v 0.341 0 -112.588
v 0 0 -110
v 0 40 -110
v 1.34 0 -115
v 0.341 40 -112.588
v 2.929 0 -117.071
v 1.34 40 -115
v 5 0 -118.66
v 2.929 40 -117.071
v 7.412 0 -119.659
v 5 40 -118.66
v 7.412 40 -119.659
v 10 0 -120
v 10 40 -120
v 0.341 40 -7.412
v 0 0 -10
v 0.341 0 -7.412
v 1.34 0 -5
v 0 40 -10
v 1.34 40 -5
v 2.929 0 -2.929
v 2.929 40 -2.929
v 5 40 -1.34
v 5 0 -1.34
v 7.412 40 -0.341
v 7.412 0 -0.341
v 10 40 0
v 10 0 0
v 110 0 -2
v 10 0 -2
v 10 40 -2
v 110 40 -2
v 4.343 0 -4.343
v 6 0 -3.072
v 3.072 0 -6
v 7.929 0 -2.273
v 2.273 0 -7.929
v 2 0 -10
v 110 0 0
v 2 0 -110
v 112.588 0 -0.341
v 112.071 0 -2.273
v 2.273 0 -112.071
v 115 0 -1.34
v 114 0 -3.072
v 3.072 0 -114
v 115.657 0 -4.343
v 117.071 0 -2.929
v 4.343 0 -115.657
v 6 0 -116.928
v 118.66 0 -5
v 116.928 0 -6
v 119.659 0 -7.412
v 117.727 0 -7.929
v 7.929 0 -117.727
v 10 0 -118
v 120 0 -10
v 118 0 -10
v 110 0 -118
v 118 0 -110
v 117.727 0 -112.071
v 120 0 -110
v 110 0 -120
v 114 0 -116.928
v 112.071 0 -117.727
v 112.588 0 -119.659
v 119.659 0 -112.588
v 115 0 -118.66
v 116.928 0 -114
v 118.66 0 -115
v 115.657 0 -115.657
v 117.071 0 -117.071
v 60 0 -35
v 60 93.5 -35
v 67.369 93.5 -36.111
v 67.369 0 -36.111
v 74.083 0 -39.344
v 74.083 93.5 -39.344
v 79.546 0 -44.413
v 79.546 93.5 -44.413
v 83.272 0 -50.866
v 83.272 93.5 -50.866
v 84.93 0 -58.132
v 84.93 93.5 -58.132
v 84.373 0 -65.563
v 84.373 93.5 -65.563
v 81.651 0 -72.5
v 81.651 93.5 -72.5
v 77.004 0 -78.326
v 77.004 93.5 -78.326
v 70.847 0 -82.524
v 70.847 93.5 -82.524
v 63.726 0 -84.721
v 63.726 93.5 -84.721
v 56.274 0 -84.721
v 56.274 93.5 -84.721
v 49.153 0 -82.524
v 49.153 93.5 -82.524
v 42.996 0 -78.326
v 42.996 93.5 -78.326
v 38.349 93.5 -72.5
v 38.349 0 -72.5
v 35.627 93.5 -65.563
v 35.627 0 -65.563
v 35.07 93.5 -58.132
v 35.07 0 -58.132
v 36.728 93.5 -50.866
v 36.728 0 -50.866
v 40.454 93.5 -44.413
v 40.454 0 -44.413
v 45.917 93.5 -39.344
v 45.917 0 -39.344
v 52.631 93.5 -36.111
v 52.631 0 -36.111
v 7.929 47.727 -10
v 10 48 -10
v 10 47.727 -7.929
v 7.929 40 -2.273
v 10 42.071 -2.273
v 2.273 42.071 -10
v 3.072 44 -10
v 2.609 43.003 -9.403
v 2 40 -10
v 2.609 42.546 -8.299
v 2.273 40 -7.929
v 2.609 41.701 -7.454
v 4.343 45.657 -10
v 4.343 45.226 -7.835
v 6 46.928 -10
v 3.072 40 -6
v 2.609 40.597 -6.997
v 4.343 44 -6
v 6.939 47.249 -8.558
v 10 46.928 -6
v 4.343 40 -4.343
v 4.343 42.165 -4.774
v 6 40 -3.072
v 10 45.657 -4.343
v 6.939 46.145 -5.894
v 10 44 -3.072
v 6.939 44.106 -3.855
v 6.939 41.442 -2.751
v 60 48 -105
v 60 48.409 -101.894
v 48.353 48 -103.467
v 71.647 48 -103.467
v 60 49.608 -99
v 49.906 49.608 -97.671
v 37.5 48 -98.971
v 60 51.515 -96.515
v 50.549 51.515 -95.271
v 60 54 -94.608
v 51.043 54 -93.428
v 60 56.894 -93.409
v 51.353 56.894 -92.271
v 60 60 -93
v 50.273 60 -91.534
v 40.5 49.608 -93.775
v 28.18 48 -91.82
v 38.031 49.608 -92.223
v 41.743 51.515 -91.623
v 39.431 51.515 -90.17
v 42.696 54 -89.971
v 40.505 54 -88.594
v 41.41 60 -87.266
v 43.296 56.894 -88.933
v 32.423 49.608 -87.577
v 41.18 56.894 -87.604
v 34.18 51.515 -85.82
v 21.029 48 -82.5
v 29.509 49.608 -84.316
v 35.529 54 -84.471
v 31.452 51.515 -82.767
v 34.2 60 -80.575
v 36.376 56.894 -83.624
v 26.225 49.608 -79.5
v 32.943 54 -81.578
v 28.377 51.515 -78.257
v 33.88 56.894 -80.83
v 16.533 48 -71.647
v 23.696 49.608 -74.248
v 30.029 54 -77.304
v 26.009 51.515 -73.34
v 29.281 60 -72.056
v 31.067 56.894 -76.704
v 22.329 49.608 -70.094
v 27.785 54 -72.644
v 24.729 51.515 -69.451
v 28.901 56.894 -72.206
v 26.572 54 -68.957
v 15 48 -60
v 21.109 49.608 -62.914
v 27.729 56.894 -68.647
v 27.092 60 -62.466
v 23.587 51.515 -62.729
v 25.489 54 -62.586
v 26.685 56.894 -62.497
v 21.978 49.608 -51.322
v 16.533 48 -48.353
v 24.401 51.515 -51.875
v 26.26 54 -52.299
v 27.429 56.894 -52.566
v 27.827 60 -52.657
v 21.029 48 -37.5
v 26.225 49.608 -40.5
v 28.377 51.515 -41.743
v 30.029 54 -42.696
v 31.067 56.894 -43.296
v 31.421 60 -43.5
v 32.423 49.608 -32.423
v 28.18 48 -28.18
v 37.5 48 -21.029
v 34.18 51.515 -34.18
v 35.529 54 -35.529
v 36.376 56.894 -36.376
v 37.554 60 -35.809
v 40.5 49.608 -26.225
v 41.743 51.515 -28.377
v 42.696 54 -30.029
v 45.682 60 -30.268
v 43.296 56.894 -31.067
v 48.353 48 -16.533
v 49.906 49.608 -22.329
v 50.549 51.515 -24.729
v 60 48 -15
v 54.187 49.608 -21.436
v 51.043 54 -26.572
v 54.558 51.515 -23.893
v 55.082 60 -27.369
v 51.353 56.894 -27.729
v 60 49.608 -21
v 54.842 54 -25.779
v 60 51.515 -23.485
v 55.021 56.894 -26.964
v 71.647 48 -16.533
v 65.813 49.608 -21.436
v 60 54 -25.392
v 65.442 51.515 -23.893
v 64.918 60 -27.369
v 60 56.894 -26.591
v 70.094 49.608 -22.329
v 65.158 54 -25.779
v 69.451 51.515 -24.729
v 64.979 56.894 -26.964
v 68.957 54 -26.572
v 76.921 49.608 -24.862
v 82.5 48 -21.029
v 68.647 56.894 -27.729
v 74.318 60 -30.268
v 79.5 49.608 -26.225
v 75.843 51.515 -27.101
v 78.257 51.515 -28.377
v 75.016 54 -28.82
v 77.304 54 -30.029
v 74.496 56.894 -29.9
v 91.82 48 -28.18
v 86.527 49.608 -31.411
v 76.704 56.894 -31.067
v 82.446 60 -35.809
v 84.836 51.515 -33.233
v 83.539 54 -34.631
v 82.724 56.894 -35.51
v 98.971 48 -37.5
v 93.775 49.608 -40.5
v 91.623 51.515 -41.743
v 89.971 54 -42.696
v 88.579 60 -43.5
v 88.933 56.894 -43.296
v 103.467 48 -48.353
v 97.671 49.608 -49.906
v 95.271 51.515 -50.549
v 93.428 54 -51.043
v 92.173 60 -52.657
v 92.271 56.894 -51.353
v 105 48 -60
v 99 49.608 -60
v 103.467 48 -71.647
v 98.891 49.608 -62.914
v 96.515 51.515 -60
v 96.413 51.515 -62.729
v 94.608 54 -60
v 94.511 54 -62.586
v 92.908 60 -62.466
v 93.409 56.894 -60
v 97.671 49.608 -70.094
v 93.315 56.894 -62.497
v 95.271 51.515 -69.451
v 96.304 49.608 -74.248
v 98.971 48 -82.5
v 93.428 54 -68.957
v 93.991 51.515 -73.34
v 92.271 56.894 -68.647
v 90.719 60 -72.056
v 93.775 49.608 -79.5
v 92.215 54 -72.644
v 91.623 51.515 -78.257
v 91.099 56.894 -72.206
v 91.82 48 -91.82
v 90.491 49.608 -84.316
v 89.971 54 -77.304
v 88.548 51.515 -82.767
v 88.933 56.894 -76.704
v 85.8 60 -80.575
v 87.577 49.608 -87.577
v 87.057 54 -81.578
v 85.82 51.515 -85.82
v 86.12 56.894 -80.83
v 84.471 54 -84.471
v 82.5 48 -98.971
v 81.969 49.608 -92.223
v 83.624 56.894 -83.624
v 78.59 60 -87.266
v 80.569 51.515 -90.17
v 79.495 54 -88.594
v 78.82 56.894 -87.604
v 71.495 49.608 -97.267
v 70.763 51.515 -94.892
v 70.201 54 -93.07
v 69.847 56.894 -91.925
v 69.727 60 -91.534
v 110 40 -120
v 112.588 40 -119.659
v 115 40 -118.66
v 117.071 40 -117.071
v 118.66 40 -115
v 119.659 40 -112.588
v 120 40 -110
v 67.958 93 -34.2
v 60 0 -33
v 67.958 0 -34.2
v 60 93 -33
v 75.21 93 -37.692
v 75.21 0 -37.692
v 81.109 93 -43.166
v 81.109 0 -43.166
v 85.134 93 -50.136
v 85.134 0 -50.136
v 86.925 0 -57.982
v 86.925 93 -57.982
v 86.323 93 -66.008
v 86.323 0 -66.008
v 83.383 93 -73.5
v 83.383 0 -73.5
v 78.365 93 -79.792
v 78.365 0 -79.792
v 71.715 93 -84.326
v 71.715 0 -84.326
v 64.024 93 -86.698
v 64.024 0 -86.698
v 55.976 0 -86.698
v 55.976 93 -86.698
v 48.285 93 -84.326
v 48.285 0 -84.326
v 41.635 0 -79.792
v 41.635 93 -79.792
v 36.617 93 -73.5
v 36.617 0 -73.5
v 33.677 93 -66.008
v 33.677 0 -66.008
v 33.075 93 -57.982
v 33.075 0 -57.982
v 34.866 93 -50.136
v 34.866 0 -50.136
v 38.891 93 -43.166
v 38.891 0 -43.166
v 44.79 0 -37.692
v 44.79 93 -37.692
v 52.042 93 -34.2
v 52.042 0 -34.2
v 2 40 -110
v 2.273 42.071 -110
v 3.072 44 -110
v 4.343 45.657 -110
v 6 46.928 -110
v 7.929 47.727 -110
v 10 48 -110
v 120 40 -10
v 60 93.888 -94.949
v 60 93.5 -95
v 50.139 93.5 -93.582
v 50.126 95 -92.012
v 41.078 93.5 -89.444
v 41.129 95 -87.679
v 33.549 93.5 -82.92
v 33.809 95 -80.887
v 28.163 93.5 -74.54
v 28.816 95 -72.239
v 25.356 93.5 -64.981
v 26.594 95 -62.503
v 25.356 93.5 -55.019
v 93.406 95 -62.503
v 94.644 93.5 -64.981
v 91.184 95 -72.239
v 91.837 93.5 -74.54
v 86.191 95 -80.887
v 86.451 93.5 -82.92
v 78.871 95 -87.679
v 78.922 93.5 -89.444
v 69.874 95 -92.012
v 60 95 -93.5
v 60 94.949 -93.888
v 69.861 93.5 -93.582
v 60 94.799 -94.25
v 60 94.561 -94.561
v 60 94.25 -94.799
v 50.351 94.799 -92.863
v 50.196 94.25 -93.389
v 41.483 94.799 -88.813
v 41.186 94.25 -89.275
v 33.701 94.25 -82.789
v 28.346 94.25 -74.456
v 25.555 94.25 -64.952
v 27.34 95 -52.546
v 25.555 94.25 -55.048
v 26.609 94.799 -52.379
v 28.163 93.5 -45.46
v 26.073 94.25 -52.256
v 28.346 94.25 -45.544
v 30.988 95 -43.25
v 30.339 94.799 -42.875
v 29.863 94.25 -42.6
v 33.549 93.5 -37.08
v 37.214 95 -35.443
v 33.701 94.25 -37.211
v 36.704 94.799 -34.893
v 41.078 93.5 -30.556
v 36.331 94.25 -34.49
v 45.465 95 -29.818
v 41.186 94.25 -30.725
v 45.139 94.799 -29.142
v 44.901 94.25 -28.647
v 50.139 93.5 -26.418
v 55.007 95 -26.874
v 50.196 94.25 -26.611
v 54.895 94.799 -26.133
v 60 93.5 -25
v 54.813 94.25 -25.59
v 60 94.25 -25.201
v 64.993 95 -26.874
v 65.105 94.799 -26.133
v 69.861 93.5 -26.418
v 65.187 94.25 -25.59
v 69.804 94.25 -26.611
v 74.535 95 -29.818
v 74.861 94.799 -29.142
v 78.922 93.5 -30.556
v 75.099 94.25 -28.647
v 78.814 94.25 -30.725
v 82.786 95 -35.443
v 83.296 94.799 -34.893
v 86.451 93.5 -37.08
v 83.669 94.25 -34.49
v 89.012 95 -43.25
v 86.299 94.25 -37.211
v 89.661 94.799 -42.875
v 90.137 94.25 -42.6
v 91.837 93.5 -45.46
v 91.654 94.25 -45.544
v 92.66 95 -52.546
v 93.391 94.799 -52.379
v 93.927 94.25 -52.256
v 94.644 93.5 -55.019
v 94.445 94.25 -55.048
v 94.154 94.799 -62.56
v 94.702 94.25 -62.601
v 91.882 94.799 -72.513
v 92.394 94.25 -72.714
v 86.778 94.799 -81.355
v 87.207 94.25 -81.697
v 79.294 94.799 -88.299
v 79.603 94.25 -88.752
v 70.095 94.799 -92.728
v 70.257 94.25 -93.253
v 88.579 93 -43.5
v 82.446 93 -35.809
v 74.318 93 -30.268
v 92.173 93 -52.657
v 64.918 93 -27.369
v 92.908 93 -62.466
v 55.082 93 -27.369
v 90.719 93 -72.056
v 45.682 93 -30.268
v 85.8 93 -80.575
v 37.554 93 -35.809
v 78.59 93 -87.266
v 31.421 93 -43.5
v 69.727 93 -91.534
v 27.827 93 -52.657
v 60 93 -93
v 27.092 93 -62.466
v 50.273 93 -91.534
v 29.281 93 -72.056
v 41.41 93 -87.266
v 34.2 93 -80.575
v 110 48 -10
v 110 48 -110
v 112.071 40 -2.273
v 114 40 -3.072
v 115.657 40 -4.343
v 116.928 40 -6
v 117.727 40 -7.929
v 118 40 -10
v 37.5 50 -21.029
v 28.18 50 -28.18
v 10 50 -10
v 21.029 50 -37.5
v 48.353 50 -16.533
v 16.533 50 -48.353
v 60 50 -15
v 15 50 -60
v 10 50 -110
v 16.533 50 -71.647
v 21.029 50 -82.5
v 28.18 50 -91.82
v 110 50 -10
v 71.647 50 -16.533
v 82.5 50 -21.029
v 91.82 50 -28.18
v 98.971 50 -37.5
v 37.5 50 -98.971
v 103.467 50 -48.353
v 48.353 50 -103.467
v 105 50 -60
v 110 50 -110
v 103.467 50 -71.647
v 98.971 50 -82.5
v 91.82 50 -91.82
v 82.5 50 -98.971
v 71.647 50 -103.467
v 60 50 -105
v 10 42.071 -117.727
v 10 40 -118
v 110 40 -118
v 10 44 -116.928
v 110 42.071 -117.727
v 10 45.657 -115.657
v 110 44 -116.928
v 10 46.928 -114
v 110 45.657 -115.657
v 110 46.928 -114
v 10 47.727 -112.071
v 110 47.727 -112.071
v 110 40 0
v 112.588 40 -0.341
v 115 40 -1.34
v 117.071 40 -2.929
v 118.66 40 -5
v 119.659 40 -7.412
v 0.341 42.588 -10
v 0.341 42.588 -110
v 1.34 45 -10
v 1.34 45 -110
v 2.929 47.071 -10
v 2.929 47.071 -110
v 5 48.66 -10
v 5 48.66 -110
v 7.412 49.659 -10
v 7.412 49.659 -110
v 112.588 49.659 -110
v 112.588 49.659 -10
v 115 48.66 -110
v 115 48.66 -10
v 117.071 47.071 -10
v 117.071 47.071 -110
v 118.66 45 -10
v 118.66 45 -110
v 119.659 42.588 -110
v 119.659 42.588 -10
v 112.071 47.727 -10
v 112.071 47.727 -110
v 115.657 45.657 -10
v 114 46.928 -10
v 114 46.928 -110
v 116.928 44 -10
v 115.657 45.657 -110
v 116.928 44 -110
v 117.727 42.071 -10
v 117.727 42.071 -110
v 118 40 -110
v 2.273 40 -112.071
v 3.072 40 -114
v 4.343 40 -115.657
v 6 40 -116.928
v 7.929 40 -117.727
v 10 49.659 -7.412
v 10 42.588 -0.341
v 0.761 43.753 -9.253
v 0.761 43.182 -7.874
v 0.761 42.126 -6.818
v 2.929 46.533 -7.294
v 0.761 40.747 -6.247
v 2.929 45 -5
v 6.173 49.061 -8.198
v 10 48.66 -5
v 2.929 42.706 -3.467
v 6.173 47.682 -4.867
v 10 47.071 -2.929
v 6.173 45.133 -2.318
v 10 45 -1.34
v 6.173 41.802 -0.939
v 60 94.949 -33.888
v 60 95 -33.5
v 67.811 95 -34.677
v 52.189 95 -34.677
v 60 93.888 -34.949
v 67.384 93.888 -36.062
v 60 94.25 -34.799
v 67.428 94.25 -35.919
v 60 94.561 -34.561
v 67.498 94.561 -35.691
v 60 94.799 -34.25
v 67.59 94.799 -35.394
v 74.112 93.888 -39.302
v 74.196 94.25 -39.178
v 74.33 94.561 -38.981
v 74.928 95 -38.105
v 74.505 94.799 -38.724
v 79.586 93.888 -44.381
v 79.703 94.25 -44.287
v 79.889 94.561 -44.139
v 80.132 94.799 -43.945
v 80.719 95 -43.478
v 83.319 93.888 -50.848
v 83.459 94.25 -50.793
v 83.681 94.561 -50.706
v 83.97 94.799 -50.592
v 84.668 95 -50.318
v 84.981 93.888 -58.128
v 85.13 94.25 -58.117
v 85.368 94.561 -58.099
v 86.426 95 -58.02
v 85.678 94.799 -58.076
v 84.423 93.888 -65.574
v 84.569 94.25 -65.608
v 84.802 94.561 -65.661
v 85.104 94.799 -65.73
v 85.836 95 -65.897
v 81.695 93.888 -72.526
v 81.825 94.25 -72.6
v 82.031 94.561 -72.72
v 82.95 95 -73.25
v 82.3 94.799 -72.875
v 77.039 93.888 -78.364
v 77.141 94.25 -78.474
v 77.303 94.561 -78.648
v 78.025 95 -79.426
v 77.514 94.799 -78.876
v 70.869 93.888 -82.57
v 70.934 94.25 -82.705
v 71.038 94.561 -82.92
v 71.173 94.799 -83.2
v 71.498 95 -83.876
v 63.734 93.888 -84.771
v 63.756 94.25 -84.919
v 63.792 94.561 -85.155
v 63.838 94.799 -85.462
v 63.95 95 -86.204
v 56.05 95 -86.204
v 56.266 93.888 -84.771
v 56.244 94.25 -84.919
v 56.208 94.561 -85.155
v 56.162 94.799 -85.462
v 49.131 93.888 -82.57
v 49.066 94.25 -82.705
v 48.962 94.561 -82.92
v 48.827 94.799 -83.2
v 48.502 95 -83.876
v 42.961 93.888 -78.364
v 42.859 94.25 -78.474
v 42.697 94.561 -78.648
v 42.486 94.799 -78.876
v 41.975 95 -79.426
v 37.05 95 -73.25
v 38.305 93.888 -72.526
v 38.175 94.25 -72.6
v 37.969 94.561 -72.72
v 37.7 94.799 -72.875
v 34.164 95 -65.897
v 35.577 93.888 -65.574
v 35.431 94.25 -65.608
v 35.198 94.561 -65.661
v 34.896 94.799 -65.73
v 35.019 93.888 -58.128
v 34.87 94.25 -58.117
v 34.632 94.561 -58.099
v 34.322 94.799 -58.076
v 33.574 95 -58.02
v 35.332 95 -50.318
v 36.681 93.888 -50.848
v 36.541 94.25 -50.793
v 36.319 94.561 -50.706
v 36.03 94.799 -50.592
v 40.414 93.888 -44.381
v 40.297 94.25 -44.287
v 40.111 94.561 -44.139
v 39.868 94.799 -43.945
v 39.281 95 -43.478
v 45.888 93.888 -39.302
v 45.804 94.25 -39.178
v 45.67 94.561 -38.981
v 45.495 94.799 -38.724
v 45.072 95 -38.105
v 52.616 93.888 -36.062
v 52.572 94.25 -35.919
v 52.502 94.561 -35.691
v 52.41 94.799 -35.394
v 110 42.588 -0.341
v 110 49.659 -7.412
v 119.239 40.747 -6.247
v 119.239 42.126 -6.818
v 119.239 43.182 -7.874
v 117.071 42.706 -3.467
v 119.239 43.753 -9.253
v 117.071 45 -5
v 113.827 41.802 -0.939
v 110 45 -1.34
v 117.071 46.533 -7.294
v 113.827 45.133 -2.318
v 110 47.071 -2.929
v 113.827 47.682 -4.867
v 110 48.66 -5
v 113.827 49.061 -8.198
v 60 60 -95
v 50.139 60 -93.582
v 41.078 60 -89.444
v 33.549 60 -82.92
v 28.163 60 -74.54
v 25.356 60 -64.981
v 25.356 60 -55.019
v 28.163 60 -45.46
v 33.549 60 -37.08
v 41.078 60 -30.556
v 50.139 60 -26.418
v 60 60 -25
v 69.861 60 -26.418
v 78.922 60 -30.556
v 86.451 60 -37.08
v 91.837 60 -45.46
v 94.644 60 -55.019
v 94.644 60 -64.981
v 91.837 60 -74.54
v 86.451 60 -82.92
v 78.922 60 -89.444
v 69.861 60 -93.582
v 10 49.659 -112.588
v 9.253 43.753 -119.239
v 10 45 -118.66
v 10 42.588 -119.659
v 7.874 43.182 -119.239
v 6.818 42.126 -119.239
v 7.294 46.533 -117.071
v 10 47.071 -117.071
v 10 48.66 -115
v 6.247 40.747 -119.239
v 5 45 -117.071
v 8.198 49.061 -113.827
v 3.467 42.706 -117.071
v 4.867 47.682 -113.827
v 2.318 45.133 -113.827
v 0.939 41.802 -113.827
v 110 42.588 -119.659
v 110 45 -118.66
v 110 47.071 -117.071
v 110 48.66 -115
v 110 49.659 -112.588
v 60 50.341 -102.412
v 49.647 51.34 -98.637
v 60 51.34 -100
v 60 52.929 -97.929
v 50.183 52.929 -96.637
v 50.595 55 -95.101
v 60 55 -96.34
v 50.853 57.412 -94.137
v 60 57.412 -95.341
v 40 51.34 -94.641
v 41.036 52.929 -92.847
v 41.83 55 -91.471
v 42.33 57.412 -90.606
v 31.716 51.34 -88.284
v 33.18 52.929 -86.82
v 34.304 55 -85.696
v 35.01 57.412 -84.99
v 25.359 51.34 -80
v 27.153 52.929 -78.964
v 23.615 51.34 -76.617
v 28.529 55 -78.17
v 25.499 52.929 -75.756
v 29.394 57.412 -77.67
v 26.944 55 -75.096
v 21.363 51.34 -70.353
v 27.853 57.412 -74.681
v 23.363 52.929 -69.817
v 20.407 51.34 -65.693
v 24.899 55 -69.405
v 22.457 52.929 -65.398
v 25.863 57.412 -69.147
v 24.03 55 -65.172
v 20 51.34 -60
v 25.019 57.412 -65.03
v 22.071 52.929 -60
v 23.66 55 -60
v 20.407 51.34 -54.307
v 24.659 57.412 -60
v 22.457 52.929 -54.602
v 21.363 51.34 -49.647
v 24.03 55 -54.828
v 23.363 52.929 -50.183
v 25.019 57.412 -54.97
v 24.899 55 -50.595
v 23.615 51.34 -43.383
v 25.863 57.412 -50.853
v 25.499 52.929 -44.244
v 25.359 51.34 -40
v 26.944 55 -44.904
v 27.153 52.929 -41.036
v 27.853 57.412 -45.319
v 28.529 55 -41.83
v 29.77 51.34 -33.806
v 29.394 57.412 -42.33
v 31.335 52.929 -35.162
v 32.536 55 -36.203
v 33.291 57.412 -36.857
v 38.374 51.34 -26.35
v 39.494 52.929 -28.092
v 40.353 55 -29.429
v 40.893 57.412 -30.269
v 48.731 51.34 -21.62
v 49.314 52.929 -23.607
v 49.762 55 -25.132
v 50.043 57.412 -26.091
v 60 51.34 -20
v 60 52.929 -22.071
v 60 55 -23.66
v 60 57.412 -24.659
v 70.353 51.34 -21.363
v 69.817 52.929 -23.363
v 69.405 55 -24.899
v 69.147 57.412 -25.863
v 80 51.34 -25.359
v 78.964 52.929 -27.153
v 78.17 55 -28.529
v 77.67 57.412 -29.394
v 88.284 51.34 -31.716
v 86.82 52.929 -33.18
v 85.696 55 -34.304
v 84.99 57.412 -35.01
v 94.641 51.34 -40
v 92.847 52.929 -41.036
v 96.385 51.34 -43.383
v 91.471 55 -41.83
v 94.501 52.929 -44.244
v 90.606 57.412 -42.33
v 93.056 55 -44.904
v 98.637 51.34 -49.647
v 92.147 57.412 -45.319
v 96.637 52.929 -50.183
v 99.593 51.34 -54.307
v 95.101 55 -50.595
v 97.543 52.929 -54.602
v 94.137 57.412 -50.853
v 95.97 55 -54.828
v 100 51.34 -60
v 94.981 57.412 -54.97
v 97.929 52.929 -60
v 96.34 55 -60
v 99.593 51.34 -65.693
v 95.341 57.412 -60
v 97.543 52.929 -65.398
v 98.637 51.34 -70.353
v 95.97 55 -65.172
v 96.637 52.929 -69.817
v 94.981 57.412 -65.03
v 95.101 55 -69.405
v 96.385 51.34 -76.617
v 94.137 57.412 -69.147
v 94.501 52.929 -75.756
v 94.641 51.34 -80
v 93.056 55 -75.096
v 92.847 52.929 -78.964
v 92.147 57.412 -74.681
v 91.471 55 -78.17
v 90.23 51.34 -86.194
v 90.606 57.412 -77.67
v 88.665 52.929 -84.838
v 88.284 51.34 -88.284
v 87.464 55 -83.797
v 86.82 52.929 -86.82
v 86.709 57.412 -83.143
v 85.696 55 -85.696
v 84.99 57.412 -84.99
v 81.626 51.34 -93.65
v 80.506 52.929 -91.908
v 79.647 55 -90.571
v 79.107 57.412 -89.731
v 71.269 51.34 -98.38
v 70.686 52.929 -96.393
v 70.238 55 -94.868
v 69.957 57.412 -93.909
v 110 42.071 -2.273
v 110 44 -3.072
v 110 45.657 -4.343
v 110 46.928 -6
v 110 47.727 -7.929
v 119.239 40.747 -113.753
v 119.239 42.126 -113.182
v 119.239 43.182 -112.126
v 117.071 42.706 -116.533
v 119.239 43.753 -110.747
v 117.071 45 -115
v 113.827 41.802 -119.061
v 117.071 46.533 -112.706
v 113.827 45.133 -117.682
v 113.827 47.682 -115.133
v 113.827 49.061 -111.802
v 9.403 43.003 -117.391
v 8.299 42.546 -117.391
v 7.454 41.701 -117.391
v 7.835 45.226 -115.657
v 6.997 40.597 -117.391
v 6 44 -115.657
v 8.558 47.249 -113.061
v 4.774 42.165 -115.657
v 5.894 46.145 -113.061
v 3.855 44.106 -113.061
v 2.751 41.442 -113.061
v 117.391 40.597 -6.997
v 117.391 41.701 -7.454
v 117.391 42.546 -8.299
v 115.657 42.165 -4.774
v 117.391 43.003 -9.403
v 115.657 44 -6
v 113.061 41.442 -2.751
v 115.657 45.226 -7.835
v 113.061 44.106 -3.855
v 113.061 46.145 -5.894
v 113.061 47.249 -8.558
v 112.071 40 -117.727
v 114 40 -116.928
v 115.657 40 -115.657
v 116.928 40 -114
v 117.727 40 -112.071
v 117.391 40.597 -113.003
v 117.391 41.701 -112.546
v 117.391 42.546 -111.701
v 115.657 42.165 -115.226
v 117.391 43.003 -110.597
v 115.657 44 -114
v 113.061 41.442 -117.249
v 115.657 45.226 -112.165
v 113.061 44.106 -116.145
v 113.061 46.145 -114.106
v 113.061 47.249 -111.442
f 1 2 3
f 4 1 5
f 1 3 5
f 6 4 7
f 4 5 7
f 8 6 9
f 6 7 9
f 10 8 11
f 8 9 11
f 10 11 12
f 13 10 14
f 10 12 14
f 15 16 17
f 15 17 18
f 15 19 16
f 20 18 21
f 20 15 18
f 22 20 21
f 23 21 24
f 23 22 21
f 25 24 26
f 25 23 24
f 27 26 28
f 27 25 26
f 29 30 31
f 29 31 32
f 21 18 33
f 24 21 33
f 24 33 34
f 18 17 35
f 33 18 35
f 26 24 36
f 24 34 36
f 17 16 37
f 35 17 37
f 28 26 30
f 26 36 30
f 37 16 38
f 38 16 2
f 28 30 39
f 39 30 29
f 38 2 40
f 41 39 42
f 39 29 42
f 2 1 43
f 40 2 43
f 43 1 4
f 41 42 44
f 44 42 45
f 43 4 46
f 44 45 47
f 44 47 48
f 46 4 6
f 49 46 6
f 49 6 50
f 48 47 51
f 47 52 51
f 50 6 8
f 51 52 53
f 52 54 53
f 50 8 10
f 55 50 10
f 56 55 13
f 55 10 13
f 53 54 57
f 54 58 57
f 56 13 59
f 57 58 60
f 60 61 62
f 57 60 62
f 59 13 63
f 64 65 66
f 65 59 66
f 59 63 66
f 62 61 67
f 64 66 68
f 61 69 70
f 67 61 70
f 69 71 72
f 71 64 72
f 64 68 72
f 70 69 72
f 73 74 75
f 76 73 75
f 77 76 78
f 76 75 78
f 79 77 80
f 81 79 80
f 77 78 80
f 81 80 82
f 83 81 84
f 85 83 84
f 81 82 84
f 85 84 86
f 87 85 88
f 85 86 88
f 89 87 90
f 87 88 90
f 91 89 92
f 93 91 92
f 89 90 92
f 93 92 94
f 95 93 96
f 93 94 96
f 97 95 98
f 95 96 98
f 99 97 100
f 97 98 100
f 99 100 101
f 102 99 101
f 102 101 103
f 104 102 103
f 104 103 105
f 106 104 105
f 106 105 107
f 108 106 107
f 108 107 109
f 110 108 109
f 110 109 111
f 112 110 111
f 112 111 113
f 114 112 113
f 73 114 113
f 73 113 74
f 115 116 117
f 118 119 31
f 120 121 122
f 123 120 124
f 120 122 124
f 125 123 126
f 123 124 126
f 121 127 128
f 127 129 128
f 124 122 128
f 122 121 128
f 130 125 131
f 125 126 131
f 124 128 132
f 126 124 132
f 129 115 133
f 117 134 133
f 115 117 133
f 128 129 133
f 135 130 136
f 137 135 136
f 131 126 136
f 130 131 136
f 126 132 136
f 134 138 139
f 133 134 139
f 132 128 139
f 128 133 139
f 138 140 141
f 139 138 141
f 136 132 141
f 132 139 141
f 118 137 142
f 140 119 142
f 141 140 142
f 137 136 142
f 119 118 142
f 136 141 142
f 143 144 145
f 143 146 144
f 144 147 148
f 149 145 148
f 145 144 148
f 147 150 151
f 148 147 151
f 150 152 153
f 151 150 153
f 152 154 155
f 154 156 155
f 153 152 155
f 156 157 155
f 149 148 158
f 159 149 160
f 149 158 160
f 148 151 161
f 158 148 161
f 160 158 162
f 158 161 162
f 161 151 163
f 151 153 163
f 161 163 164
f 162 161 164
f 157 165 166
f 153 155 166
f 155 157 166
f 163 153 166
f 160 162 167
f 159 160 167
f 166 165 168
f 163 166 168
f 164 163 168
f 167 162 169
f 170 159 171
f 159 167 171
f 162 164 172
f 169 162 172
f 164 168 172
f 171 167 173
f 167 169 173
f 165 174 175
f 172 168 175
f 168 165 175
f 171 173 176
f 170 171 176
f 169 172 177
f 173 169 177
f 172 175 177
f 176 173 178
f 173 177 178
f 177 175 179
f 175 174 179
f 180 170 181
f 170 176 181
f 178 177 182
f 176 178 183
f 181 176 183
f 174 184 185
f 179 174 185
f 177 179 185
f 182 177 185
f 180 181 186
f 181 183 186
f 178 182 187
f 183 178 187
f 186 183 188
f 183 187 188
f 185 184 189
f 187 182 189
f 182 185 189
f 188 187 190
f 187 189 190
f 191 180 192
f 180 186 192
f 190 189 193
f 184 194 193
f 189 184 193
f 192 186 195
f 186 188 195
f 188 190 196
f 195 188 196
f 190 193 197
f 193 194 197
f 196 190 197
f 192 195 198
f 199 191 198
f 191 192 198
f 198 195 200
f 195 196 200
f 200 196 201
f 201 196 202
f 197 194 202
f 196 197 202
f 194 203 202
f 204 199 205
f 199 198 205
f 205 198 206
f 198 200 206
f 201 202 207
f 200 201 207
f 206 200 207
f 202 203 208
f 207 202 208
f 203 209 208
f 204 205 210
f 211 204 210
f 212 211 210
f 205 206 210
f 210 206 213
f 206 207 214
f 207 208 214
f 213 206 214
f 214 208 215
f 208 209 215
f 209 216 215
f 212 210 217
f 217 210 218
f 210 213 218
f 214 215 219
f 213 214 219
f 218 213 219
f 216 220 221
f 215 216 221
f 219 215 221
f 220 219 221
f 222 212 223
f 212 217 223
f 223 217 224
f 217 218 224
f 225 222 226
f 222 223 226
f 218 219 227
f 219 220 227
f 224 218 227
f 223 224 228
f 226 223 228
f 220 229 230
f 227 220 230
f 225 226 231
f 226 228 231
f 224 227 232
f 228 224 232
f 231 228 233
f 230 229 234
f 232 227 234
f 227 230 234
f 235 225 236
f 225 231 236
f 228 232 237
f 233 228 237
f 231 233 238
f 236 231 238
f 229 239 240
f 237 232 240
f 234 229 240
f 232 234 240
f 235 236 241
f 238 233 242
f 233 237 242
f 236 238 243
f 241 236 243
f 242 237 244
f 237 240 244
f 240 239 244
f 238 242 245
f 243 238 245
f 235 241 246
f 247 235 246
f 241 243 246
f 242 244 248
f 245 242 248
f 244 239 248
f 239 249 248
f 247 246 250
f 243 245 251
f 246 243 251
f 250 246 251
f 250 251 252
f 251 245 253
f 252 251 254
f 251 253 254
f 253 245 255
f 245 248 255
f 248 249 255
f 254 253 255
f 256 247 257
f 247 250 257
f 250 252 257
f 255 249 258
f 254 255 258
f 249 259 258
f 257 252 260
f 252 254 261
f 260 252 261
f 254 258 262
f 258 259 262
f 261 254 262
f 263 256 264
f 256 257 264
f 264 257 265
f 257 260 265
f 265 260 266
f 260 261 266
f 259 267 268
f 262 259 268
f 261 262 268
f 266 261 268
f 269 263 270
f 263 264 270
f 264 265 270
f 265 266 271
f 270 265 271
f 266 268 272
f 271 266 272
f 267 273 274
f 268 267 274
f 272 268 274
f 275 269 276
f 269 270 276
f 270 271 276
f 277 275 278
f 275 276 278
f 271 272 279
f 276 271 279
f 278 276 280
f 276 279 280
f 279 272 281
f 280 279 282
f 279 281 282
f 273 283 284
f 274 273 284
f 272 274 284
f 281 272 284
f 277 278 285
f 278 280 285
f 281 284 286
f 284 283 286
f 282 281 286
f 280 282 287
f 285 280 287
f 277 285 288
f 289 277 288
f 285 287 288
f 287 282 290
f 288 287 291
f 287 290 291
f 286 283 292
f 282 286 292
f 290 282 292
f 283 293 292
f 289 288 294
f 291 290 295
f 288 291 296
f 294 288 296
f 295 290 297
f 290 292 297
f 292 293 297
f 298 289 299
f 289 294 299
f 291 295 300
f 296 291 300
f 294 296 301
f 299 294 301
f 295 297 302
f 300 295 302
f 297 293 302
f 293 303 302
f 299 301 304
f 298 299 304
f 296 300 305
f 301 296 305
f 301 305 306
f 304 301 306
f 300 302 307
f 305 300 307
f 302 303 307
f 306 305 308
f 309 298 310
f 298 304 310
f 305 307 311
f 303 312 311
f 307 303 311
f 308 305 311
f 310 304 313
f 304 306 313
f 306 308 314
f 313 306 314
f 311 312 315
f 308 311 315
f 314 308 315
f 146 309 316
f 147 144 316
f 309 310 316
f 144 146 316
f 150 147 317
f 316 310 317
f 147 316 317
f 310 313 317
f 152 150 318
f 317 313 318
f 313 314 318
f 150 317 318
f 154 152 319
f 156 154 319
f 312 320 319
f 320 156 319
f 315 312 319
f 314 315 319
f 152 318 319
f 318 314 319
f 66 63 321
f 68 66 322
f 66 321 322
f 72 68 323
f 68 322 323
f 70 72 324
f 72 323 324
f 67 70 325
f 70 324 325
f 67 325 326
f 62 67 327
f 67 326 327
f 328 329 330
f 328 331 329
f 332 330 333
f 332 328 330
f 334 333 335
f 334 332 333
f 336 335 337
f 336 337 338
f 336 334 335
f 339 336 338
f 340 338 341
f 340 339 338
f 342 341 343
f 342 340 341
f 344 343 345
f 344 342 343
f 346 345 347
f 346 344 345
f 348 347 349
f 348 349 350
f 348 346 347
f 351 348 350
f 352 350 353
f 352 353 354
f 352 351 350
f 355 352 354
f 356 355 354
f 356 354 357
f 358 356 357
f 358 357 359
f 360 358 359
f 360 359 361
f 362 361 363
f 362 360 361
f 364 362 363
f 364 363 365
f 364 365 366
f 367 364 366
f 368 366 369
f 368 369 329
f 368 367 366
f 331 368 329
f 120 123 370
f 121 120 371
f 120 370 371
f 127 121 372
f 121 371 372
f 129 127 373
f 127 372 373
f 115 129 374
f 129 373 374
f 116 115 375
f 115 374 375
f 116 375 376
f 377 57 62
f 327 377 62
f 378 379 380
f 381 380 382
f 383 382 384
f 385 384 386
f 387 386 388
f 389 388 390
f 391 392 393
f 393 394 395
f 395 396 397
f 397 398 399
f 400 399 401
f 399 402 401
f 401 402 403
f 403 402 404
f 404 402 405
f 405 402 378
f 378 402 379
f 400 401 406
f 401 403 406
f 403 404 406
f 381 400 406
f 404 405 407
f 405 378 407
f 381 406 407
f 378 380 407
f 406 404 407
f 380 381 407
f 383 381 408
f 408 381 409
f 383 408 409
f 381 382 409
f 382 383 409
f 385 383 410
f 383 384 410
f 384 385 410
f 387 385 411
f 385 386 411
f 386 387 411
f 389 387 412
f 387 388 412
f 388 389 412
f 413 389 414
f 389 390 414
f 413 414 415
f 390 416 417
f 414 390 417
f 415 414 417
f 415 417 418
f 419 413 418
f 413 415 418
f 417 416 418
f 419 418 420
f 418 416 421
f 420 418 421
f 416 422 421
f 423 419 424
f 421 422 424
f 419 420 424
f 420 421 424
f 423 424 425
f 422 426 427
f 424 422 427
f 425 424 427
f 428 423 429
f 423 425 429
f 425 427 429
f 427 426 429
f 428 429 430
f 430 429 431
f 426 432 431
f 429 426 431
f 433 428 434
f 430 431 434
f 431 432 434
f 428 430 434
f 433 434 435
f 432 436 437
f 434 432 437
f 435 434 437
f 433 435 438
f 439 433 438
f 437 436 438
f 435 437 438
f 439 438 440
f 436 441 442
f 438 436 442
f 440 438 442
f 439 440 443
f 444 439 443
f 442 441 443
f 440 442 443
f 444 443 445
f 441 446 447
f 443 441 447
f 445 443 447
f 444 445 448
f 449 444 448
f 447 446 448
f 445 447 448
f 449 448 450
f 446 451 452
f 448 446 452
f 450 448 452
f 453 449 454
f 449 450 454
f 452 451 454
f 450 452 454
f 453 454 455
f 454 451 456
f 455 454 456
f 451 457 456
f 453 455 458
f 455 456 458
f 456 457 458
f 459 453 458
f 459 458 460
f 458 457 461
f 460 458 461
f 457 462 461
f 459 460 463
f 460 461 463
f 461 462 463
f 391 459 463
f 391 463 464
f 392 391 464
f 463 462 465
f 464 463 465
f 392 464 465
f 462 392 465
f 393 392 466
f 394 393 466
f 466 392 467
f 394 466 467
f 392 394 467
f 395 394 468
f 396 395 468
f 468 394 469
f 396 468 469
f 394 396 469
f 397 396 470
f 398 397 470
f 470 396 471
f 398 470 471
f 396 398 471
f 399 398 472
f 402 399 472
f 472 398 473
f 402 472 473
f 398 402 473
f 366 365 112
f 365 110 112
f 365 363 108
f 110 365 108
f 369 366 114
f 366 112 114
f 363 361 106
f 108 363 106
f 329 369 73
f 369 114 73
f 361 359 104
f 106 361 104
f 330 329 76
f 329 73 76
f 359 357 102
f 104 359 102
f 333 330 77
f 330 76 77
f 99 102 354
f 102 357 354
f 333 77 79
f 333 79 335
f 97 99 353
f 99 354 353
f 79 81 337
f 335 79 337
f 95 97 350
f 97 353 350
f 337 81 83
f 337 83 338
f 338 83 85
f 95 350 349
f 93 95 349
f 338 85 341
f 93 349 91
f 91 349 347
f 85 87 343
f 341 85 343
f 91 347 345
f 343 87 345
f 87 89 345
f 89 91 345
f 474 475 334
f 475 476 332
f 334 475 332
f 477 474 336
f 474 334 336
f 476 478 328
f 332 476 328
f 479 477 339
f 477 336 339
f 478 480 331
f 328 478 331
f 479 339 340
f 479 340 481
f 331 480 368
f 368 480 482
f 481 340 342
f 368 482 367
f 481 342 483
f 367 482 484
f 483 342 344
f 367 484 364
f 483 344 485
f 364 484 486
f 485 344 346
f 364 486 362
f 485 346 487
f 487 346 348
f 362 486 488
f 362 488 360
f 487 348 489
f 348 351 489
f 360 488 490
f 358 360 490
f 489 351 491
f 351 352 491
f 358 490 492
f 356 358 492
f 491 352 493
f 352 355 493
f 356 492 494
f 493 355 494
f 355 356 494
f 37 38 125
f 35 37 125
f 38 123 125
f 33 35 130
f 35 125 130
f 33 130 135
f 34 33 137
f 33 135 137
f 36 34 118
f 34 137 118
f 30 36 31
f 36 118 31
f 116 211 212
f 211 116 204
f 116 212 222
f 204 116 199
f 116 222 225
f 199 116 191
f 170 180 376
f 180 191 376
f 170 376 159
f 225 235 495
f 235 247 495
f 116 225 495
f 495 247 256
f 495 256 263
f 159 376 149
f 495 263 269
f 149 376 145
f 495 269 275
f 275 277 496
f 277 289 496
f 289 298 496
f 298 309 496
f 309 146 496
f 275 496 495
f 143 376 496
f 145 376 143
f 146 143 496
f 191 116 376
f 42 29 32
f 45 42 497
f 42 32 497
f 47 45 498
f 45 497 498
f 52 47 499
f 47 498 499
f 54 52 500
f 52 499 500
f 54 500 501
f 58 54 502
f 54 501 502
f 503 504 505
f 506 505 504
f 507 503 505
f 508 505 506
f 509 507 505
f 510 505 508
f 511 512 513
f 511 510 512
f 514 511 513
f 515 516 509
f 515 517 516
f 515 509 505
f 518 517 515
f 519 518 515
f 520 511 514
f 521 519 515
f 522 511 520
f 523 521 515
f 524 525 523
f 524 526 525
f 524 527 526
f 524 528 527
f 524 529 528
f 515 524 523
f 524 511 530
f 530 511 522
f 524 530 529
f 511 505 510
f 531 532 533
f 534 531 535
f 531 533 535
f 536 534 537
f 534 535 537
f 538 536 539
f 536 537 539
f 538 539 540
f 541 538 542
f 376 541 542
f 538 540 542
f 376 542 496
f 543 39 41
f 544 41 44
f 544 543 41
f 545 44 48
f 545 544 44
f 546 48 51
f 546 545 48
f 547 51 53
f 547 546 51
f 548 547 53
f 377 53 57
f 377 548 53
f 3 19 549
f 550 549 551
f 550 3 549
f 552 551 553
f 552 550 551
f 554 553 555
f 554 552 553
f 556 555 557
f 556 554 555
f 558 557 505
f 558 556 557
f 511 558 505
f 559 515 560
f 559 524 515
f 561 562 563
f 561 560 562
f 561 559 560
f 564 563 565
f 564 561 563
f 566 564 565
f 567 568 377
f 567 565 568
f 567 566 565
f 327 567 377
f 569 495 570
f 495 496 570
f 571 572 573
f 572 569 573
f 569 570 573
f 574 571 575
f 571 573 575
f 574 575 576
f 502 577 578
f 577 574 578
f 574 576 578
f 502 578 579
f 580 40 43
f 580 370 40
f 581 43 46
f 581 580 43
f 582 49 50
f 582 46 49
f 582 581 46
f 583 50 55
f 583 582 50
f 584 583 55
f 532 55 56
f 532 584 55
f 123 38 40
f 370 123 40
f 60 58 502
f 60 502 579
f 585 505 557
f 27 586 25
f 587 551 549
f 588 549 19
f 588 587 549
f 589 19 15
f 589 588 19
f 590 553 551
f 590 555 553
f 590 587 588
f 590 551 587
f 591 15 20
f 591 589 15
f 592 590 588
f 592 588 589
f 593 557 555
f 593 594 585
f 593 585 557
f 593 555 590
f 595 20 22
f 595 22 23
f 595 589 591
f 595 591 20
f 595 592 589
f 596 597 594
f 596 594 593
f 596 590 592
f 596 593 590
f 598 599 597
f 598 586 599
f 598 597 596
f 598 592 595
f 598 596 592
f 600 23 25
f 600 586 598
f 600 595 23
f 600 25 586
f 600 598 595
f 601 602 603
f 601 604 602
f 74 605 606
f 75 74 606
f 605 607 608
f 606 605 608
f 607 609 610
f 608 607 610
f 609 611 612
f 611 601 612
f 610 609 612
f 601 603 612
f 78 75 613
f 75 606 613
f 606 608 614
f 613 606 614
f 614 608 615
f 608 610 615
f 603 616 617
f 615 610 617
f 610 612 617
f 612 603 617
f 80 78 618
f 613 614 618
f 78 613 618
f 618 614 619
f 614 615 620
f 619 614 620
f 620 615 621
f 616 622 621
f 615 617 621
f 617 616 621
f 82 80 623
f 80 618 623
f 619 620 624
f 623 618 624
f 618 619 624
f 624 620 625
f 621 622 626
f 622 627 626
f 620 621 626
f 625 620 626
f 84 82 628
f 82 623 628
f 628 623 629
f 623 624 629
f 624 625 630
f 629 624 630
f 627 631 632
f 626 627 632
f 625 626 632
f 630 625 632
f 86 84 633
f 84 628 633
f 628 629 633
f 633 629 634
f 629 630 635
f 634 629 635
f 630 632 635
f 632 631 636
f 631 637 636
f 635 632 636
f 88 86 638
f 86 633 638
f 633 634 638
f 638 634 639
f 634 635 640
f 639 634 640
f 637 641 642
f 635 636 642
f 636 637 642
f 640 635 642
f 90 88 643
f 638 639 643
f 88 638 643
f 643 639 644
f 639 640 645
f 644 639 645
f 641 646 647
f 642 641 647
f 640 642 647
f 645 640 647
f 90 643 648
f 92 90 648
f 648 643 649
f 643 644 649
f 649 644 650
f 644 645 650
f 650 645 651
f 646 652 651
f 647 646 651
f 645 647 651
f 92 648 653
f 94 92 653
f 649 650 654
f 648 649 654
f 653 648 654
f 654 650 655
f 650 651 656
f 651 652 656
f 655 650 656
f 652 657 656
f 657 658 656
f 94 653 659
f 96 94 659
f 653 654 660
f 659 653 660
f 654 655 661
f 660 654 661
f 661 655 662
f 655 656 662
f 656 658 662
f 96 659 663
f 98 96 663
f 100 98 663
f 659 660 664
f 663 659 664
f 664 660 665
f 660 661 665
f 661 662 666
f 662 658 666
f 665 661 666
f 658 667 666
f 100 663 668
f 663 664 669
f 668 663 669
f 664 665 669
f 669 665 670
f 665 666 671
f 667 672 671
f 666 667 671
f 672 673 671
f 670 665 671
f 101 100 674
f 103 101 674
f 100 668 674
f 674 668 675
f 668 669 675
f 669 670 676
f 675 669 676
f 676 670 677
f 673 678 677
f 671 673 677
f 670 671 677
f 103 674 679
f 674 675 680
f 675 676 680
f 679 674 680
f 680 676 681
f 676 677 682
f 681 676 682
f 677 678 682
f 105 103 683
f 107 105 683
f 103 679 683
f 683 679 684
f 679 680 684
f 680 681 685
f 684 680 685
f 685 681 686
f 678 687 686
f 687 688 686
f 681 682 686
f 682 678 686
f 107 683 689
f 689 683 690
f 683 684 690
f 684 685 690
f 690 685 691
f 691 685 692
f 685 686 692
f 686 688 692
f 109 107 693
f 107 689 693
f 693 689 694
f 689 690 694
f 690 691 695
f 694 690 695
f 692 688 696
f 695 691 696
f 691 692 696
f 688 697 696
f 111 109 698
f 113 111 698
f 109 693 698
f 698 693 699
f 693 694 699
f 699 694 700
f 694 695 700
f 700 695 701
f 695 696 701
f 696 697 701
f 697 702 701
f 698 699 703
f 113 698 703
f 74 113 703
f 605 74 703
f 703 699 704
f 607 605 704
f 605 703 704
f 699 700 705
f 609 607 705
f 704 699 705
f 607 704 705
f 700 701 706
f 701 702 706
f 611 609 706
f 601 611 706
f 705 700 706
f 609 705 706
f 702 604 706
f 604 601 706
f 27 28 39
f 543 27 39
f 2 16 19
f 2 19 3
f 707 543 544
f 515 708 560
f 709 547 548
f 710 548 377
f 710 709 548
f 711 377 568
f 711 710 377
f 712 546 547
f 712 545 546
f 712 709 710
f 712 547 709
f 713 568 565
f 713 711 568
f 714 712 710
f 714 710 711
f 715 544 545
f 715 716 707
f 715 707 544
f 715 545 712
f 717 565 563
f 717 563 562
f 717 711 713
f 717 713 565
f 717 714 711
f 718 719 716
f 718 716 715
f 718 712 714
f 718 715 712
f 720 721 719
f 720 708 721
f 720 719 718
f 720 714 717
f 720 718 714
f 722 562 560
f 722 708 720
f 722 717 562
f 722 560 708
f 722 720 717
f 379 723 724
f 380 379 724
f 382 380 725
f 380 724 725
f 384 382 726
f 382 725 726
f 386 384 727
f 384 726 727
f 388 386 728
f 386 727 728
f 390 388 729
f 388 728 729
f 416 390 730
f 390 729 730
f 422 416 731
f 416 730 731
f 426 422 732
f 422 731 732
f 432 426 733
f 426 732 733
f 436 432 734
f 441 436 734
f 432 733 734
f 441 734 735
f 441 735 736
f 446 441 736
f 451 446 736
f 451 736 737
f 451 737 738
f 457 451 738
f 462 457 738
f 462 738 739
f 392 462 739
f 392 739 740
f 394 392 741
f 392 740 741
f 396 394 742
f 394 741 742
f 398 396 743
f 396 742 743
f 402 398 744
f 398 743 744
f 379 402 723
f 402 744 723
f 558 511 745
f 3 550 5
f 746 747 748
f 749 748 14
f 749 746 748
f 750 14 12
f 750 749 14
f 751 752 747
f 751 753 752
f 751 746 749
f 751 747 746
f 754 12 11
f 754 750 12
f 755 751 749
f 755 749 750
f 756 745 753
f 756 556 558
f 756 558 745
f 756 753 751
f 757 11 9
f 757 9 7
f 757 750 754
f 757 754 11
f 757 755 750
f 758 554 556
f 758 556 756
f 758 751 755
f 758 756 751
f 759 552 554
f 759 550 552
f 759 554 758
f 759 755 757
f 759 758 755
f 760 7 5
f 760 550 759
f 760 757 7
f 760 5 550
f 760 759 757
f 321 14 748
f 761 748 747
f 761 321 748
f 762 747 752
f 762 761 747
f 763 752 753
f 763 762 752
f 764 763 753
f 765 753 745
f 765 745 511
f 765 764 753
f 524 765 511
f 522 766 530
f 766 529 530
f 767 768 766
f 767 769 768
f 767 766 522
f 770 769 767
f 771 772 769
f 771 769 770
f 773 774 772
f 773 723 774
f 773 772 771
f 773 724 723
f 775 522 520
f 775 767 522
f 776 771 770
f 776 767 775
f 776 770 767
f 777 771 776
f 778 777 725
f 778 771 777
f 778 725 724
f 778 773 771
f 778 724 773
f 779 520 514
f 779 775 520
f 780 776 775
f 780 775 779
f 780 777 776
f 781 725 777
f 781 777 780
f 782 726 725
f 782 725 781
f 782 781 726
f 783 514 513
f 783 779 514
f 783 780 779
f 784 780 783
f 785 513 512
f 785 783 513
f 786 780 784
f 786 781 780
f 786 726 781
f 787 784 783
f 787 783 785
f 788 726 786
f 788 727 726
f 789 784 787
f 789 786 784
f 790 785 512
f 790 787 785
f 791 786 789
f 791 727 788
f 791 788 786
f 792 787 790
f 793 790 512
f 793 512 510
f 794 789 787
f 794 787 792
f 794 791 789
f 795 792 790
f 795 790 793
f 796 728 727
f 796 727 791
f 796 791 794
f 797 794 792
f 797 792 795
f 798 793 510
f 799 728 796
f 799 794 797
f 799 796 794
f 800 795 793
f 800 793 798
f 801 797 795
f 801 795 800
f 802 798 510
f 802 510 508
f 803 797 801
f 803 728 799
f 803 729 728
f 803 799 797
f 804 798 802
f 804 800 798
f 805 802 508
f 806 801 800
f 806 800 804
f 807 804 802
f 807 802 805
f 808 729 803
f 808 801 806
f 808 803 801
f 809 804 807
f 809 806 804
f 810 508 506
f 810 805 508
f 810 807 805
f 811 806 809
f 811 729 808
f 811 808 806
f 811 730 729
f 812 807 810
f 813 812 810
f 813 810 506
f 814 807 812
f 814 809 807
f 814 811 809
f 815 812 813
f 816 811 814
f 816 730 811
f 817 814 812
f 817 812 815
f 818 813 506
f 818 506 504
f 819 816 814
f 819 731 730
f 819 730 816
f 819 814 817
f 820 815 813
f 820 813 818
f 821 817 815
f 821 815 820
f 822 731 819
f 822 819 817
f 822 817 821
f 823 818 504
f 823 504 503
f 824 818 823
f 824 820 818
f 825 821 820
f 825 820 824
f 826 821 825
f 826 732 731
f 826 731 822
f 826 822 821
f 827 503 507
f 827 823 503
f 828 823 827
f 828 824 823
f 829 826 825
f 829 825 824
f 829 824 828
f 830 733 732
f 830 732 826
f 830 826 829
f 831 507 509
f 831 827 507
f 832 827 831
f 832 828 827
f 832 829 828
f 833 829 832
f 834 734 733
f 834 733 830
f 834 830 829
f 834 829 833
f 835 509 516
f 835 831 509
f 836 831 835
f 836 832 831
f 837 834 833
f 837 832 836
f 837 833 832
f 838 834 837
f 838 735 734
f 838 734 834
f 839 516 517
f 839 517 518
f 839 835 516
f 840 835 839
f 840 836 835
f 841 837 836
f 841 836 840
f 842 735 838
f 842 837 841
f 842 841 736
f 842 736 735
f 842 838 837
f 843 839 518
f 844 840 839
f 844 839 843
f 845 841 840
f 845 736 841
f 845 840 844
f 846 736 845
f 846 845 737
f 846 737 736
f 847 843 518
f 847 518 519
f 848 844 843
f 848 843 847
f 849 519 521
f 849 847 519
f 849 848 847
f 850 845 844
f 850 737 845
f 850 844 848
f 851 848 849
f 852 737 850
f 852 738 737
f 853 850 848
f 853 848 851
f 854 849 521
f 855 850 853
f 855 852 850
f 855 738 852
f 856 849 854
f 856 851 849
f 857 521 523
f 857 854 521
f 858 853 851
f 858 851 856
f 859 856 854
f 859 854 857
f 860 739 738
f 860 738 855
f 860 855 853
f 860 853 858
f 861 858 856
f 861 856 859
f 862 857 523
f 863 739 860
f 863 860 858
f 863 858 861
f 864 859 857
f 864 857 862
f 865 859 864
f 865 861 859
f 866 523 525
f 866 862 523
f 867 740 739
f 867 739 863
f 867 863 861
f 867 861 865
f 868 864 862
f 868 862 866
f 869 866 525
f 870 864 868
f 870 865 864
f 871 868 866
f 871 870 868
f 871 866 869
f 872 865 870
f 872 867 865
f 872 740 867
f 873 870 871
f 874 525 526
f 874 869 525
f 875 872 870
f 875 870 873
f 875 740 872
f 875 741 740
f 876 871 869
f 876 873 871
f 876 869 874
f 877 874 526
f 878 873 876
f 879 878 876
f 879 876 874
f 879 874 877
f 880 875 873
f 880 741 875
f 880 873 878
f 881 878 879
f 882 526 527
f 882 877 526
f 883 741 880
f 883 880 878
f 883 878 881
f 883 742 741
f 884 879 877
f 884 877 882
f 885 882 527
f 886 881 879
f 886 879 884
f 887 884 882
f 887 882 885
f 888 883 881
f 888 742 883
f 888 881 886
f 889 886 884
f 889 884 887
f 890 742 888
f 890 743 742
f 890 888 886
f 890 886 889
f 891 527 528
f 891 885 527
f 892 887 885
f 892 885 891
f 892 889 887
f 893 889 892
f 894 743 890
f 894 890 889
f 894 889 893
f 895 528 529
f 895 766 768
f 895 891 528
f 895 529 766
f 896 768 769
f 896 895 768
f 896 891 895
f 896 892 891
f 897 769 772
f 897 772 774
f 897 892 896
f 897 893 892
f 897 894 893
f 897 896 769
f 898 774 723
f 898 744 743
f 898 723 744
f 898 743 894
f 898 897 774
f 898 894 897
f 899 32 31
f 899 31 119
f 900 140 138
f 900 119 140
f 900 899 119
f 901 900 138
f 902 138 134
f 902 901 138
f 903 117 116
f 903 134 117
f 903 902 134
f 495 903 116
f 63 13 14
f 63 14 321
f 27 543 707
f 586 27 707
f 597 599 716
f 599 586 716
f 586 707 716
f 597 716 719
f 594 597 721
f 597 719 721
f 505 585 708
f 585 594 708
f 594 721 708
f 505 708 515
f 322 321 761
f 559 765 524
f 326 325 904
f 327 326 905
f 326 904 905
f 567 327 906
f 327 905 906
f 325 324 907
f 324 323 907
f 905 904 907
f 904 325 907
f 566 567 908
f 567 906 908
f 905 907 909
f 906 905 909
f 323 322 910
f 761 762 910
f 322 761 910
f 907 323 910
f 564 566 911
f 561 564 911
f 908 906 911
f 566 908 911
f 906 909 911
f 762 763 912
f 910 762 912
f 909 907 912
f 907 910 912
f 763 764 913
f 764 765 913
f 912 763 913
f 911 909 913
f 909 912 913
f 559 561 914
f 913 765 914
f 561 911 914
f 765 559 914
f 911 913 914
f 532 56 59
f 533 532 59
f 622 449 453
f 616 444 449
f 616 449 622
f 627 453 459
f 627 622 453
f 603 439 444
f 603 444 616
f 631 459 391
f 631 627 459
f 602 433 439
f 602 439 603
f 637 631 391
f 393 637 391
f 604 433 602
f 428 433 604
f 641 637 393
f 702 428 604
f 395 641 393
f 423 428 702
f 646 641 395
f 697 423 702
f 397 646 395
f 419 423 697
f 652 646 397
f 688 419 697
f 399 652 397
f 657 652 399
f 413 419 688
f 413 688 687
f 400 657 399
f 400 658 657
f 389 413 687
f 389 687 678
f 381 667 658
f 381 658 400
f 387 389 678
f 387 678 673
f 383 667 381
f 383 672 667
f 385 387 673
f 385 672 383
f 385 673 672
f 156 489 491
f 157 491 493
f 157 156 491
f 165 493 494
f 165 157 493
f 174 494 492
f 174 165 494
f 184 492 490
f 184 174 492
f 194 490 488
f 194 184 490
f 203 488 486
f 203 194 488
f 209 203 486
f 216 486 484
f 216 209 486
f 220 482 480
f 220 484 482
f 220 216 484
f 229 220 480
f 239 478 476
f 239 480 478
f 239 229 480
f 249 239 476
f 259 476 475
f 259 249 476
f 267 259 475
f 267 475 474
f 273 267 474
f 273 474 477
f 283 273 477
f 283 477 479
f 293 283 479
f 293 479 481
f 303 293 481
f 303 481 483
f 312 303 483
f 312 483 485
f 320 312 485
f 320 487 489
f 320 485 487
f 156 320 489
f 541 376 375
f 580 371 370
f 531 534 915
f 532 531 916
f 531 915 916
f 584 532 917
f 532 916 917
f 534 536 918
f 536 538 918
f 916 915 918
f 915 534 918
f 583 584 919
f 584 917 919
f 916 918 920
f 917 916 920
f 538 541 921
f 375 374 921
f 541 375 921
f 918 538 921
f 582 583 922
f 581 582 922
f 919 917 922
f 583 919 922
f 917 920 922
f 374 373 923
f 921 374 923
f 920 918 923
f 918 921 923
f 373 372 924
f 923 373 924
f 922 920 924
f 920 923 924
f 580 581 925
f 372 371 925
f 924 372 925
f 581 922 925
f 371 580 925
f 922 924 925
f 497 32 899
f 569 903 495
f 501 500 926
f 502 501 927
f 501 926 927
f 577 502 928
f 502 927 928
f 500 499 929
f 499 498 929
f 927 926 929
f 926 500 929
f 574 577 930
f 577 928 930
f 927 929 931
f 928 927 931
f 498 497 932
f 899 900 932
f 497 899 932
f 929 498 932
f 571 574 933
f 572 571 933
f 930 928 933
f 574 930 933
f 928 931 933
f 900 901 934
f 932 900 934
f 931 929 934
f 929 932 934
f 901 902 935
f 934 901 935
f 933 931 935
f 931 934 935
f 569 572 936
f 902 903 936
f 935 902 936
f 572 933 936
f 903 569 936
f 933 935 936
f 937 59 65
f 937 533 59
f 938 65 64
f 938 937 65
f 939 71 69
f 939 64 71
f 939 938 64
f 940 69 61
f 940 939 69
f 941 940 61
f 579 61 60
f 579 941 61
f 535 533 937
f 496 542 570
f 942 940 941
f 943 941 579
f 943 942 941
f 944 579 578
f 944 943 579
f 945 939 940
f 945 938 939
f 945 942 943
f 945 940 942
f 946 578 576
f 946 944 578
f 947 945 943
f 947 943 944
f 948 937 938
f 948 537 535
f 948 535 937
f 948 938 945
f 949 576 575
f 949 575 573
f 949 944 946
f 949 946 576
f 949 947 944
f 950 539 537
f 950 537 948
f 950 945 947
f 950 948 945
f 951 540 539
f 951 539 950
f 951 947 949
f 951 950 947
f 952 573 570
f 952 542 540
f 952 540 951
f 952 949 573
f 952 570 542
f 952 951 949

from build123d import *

# Parameters (mm, degrees)
SKETCH3_W           = 120
SKETCH3_H           = 120
BOSS_EXTRUDE2_DEPTH = 50
SKETCH4_R           = 35
BOSS_EXTRUDE3_DEPTH = 45
SKETCH9_R           = 25
CUT_EXTRUDE3_DEPTH  = 195.486503388
FILLET4_R           = 10
FILLET5_R           = 1.5
SHELL2_T            = -2


with BuildPart() as part:
    # Sketch3 → Boss-Extrude2 (new body)
    with BuildSketch(Plane(origin=(0, 0, 0), x_dir=(1, 0, 0), z_dir=(0, 1, 0))):
        with Locations((60, 60)):
            Rectangle(SKETCH3_W, SKETCH3_H)
    extrude(amount=BOSS_EXTRUDE2_DEPTH)

    # Sketch4 → Boss-Extrude3 (add)
    with BuildSketch(Plane(origin=(0, 50, 0), x_dir=(1, 0, 0), z_dir=(0, 1, 0))):
        with Locations(Location((60, 60, 0), (0, 0, 90))):
            Circle(SKETCH4_R)
    extrude(amount=BOSS_EXTRUDE3_DEPTH)

    # Sketch9 → Cut-Extrude3 (cut, through all)
    with BuildSketch(Plane(origin=(0, 95, 0), x_dir=(1, 0, 0), z_dir=(0, 1, 0))):
        with Locations(Location((60, 60, 0), (0, 0, 270))):
            Circle(SKETCH9_R)
    extrude(amount=-CUT_EXTRUDE3_DEPTH, mode=Mode.SUBTRACT)

    # Fillet4
    fillet4_edges = [part.edges().sort_by_distance(p)[0] for p in [
        (60, 50, 0),
        (60, 50, -25),
        (0, 50, -60),
        (60, 50, -120),
        (0, 25, -120),
        (0, 25, 0),
        (120, 25, 0),
        (120, 25, -120),
        (120, 50, -60),
    ]]
    fillet(fillet4_edges, radius=FILLET4_R)

    # Fillet5
    fillet5_edges = [part.edges().sort_by_distance(p)[0] for p in [
        (60, 95, -25),
        (60, 95, -85),
    ]]
    fillet(fillet5_edges, radius=FILLET5_R)

    # Shell2
    shell2_openings = [part.faces().sort_by_distance(p)[0] for p in [
        (60, 0, -1.697056275),
    ]]
    offset(amount=SHELL2_T, openings=shell2_openings, kind=Kind.INTERSECTION)


solid = part.part
